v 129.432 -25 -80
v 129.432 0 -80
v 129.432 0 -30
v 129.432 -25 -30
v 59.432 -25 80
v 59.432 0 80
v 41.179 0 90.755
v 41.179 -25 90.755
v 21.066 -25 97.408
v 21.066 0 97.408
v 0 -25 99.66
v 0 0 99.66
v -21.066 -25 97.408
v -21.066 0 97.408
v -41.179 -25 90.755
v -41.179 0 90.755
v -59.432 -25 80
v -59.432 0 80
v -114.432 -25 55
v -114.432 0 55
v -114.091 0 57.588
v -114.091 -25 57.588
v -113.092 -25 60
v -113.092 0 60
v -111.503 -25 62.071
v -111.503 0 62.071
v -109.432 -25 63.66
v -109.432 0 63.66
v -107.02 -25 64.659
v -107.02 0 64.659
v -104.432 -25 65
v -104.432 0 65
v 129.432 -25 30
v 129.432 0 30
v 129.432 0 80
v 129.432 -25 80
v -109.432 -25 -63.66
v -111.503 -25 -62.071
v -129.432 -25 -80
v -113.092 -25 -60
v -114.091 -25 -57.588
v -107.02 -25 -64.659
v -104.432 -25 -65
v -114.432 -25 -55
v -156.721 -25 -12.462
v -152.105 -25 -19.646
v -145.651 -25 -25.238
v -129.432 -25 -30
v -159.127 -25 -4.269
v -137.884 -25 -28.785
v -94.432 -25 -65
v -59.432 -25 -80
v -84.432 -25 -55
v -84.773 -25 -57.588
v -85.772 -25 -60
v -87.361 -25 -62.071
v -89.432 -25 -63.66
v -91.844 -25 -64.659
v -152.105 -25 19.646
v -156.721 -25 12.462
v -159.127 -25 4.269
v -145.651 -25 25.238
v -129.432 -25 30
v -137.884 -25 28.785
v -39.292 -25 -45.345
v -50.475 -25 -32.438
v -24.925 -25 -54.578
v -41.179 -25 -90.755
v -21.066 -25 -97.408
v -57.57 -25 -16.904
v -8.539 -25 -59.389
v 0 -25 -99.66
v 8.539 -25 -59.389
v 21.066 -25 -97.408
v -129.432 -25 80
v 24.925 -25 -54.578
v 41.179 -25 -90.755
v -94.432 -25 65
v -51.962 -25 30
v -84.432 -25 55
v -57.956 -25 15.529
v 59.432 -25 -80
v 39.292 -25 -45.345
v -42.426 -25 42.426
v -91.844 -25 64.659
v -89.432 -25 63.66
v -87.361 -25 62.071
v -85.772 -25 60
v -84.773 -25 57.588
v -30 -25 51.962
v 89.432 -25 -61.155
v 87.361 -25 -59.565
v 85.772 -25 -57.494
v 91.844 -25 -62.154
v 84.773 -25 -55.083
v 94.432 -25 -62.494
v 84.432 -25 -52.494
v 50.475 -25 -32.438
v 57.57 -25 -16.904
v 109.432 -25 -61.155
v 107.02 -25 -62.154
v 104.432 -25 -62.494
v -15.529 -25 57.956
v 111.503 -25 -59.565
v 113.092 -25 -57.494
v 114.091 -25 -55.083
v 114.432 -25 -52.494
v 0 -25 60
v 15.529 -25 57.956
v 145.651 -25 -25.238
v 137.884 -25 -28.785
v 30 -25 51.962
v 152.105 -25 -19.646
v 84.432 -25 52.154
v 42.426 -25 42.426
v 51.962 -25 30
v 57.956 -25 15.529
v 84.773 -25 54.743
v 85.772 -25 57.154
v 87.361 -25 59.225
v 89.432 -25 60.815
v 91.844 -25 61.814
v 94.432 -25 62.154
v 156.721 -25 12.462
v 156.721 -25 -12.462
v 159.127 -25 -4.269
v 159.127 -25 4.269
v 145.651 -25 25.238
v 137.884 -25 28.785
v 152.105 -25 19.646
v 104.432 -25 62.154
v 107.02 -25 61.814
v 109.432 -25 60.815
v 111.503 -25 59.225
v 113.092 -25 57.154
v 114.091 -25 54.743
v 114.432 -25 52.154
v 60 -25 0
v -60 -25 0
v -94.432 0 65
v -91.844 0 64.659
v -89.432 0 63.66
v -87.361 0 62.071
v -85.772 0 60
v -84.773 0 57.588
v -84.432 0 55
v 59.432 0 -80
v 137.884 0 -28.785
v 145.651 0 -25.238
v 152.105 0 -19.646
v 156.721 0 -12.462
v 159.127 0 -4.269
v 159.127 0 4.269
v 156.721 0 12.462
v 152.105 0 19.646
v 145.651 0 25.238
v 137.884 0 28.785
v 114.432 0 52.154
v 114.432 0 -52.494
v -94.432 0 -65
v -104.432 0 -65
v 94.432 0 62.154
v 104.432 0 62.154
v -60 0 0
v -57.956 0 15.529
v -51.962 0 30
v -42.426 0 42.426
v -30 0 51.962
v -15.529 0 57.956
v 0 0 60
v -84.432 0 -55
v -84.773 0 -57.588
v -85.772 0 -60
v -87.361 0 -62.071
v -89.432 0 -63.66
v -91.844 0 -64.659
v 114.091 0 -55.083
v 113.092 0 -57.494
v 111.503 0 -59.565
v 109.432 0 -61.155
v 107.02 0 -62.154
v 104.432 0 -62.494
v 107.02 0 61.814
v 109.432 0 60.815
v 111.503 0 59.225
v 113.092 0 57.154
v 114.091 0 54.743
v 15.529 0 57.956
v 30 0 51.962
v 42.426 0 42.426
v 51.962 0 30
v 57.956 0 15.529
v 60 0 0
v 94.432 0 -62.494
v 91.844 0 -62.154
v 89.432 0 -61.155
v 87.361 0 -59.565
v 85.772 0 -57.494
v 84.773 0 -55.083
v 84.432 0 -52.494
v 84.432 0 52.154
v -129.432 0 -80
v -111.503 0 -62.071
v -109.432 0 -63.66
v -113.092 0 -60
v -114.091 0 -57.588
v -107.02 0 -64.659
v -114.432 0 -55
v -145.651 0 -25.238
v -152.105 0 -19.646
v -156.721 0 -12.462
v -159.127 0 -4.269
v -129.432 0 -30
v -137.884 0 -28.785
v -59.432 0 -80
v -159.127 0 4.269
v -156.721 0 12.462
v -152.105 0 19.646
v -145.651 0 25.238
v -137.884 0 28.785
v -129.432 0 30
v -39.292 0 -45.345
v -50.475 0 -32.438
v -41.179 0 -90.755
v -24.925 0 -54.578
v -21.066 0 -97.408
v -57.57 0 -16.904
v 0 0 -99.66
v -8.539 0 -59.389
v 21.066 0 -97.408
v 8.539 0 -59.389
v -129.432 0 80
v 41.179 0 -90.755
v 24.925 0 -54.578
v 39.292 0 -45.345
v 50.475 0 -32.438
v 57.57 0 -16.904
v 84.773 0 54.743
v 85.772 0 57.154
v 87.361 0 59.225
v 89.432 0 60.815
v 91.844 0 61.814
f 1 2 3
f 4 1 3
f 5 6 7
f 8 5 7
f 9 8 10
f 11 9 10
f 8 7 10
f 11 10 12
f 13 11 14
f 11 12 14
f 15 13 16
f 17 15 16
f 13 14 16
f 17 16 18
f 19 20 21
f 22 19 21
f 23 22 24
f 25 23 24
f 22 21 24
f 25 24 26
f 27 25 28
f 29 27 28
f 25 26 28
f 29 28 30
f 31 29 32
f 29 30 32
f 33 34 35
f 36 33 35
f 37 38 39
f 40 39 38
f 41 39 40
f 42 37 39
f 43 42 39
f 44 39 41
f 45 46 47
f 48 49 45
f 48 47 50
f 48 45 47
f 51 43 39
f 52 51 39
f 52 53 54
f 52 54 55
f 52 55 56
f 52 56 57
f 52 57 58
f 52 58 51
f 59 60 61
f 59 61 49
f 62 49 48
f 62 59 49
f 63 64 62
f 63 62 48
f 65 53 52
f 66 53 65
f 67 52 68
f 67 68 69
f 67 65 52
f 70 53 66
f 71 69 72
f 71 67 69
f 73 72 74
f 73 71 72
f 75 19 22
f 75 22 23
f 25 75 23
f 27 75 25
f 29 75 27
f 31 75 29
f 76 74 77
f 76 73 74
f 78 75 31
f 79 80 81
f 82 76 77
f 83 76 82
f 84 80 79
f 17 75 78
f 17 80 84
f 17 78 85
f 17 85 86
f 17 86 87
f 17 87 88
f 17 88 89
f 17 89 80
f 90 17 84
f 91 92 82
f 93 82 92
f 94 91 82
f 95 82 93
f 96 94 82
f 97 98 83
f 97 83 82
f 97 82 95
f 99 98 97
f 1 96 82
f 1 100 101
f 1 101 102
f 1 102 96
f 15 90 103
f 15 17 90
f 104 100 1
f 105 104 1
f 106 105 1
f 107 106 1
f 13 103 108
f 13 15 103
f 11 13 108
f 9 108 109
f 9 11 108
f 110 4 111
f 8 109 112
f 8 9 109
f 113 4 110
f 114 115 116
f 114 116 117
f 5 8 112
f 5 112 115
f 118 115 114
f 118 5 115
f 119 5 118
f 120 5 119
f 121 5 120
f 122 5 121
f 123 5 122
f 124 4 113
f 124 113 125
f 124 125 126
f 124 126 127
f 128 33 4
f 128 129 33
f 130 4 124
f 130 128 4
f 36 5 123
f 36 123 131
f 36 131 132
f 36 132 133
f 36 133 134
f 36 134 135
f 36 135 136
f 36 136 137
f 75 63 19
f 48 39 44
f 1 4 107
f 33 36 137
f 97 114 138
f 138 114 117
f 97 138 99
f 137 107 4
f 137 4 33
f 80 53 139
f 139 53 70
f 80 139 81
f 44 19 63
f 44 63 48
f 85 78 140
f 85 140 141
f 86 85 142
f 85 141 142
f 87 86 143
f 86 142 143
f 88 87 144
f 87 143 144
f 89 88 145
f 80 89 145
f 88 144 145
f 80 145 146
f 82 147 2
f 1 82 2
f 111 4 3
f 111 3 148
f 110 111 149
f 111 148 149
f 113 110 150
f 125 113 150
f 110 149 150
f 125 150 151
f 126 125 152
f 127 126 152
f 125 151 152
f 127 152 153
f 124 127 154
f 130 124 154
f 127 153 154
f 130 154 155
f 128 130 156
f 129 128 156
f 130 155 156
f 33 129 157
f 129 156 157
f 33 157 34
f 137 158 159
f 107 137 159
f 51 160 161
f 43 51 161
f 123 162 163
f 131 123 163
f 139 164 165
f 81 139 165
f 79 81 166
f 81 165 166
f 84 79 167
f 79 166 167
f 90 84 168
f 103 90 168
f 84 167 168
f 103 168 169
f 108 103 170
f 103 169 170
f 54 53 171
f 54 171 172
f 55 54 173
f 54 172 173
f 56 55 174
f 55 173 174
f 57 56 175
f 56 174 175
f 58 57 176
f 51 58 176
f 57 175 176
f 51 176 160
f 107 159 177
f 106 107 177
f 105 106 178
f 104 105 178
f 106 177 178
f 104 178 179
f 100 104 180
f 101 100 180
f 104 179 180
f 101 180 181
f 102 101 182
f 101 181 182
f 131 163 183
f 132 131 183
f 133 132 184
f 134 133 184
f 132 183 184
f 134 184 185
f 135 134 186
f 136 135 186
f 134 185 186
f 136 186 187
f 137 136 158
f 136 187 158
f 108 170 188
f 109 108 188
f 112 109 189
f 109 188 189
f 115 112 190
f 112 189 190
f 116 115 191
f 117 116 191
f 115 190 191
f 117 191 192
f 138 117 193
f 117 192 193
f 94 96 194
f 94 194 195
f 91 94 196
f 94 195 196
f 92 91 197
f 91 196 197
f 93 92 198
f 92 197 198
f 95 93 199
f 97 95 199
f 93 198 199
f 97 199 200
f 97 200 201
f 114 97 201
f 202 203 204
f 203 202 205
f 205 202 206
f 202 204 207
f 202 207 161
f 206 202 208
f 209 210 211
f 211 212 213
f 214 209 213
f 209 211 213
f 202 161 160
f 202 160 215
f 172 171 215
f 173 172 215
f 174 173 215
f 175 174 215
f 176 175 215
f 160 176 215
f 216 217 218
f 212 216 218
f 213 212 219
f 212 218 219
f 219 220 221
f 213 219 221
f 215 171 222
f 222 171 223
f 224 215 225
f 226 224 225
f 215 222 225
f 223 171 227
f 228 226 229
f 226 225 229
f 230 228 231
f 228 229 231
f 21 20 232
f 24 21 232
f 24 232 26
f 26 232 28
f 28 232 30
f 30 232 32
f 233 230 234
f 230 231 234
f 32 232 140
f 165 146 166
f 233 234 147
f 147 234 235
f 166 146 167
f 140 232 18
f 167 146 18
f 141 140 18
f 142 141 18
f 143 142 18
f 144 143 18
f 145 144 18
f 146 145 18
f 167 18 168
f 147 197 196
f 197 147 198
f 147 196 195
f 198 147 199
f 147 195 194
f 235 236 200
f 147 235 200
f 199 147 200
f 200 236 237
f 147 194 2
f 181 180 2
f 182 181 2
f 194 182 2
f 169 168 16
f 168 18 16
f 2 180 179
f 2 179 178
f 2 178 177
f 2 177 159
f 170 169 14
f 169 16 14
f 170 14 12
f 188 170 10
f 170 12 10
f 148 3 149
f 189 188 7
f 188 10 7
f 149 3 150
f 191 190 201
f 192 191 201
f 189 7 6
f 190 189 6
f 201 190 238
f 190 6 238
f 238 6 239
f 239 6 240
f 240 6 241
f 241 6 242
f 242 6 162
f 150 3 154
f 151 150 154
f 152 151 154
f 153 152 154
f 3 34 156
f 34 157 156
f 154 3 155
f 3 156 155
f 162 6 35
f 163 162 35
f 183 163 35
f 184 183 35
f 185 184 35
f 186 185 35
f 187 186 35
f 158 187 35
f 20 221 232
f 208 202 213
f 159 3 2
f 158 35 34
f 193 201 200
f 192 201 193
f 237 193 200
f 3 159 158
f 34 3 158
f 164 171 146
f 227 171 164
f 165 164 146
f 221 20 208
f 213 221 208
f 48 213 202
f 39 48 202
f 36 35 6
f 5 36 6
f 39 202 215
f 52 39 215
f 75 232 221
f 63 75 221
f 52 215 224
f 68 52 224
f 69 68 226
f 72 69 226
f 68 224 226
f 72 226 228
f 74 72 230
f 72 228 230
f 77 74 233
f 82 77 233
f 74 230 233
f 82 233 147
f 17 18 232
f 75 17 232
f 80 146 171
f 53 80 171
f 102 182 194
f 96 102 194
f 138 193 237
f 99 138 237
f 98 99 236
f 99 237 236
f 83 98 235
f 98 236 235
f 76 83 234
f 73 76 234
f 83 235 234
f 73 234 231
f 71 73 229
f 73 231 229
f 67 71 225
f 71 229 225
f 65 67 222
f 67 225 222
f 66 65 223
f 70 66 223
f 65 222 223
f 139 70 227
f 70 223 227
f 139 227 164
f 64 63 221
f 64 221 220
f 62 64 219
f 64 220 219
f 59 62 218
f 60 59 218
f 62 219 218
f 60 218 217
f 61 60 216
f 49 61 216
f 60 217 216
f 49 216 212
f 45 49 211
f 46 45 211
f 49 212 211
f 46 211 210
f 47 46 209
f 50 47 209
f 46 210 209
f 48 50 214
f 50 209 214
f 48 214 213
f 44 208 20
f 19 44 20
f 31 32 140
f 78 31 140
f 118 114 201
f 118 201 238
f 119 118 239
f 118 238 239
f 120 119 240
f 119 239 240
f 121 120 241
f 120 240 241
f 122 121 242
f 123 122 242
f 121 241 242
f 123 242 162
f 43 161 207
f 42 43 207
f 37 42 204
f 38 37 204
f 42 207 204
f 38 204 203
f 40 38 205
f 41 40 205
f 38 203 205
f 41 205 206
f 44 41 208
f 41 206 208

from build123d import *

# Parameters (mm, degrees)
F1_DEPTH = 25


with BuildPart() as f1:
    # F0 (on Front) → F1 (new body)
    with BuildSketch(Plane.XZ):
        with BuildLine():
            Line((-59.432037, 80), (-129.432037, 80))
            Line((-129.432037, 80), (-129.432037, 30))
            ThreePointArc((-129.432037, 30), (-159.432037, 0), (-129.432037, -30))
            Line((-129.432037, -30), (-129.432037, -80))
            Line((-129.432037, -80), (-59.432037, -80))
            ThreePointArc((-59.432037, -80), (0, -99.660258), (59.432037, -80))
            Line((59.432037, -80), (129.432037, -80))
            Line((129.432037, -80), (129.432037, -30))
            ThreePointArc((129.432037, -30), (159.432037, 0), (129.432037, 30))
            Line((129.432037, 30), (129.432037, 80))
            Line((129.432037, 80), (59.432037, 80))
            ThreePointArc((59.432037, 80), (0, 99.660258), (-59.432037, 80))
        make_face()
        with BuildLine():
            Line((84.432037, -52.494368), (84.432037, 0))
            Line((84.432037, 0), (84.432037, 52.154386))
            ThreePointArc((84.432037, 52.154386), (87.36097, 59.225454), (94.432037, 62.154386))
            Line((94.432037, 62.154386), (104.432037, 62.154386))
            ThreePointArc((104.432037, 62.154386), (111.503105, 59.225454), (114.432037, 52.154386))
            Line((114.432037, 52.154386), (114.432037, -52.494368))
            ThreePointArc((114.432037, -52.494368), (111.503105, -59.565436), (104.432037, -62.494368))
            Line((104.432037, -62.494368), (94.432037, -62.494368))
            ThreePointArc((94.432037, -62.494368), (87.36097, -59.565436), (84.432037, -52.494368))
        make_face(mode=Mode.SUBTRACT)
        with BuildLine():
            Line((-84.432037, 55), (-84.432037, 0))
            Line((-84.432037, 0), (-84.432037, -55))
            ThreePointArc((-84.432037, -55), (-87.36097, -62.071068), (-94.432037, -65))
            Line((-94.432037, -65), (-104.432037, -65))
            ThreePointArc((-104.432037, -65), (-111.503105, -62.071068), (-114.432037, -55))
            Line((-114.432037, -55), (-114.432037, 55))
            ThreePointArc((-114.432037, 55), (-111.503105, 62.071068), (-104.432037, 65))
            Line((-104.432037, 65), (-94.432037, 65))
            ThreePointArc((-94.432037, 65), (-87.36097, 62.071068), (-84.432037, 55))
        make_face(mode=Mode.SUBTRACT)
        with BuildLine():
            ThreePointArc((0, 60), (42.426407, 42.426407), (60, 0))
            ThreePointArc((60, 0), (0, -60), (-60, 0))
            ThreePointArc((-60, 0), (-42.426407, 42.426407), (0, 60))
        make_face(mode=Mode.SUBTRACT)
    extrude(amount=F1_DEPTH)


solid = f1.part
